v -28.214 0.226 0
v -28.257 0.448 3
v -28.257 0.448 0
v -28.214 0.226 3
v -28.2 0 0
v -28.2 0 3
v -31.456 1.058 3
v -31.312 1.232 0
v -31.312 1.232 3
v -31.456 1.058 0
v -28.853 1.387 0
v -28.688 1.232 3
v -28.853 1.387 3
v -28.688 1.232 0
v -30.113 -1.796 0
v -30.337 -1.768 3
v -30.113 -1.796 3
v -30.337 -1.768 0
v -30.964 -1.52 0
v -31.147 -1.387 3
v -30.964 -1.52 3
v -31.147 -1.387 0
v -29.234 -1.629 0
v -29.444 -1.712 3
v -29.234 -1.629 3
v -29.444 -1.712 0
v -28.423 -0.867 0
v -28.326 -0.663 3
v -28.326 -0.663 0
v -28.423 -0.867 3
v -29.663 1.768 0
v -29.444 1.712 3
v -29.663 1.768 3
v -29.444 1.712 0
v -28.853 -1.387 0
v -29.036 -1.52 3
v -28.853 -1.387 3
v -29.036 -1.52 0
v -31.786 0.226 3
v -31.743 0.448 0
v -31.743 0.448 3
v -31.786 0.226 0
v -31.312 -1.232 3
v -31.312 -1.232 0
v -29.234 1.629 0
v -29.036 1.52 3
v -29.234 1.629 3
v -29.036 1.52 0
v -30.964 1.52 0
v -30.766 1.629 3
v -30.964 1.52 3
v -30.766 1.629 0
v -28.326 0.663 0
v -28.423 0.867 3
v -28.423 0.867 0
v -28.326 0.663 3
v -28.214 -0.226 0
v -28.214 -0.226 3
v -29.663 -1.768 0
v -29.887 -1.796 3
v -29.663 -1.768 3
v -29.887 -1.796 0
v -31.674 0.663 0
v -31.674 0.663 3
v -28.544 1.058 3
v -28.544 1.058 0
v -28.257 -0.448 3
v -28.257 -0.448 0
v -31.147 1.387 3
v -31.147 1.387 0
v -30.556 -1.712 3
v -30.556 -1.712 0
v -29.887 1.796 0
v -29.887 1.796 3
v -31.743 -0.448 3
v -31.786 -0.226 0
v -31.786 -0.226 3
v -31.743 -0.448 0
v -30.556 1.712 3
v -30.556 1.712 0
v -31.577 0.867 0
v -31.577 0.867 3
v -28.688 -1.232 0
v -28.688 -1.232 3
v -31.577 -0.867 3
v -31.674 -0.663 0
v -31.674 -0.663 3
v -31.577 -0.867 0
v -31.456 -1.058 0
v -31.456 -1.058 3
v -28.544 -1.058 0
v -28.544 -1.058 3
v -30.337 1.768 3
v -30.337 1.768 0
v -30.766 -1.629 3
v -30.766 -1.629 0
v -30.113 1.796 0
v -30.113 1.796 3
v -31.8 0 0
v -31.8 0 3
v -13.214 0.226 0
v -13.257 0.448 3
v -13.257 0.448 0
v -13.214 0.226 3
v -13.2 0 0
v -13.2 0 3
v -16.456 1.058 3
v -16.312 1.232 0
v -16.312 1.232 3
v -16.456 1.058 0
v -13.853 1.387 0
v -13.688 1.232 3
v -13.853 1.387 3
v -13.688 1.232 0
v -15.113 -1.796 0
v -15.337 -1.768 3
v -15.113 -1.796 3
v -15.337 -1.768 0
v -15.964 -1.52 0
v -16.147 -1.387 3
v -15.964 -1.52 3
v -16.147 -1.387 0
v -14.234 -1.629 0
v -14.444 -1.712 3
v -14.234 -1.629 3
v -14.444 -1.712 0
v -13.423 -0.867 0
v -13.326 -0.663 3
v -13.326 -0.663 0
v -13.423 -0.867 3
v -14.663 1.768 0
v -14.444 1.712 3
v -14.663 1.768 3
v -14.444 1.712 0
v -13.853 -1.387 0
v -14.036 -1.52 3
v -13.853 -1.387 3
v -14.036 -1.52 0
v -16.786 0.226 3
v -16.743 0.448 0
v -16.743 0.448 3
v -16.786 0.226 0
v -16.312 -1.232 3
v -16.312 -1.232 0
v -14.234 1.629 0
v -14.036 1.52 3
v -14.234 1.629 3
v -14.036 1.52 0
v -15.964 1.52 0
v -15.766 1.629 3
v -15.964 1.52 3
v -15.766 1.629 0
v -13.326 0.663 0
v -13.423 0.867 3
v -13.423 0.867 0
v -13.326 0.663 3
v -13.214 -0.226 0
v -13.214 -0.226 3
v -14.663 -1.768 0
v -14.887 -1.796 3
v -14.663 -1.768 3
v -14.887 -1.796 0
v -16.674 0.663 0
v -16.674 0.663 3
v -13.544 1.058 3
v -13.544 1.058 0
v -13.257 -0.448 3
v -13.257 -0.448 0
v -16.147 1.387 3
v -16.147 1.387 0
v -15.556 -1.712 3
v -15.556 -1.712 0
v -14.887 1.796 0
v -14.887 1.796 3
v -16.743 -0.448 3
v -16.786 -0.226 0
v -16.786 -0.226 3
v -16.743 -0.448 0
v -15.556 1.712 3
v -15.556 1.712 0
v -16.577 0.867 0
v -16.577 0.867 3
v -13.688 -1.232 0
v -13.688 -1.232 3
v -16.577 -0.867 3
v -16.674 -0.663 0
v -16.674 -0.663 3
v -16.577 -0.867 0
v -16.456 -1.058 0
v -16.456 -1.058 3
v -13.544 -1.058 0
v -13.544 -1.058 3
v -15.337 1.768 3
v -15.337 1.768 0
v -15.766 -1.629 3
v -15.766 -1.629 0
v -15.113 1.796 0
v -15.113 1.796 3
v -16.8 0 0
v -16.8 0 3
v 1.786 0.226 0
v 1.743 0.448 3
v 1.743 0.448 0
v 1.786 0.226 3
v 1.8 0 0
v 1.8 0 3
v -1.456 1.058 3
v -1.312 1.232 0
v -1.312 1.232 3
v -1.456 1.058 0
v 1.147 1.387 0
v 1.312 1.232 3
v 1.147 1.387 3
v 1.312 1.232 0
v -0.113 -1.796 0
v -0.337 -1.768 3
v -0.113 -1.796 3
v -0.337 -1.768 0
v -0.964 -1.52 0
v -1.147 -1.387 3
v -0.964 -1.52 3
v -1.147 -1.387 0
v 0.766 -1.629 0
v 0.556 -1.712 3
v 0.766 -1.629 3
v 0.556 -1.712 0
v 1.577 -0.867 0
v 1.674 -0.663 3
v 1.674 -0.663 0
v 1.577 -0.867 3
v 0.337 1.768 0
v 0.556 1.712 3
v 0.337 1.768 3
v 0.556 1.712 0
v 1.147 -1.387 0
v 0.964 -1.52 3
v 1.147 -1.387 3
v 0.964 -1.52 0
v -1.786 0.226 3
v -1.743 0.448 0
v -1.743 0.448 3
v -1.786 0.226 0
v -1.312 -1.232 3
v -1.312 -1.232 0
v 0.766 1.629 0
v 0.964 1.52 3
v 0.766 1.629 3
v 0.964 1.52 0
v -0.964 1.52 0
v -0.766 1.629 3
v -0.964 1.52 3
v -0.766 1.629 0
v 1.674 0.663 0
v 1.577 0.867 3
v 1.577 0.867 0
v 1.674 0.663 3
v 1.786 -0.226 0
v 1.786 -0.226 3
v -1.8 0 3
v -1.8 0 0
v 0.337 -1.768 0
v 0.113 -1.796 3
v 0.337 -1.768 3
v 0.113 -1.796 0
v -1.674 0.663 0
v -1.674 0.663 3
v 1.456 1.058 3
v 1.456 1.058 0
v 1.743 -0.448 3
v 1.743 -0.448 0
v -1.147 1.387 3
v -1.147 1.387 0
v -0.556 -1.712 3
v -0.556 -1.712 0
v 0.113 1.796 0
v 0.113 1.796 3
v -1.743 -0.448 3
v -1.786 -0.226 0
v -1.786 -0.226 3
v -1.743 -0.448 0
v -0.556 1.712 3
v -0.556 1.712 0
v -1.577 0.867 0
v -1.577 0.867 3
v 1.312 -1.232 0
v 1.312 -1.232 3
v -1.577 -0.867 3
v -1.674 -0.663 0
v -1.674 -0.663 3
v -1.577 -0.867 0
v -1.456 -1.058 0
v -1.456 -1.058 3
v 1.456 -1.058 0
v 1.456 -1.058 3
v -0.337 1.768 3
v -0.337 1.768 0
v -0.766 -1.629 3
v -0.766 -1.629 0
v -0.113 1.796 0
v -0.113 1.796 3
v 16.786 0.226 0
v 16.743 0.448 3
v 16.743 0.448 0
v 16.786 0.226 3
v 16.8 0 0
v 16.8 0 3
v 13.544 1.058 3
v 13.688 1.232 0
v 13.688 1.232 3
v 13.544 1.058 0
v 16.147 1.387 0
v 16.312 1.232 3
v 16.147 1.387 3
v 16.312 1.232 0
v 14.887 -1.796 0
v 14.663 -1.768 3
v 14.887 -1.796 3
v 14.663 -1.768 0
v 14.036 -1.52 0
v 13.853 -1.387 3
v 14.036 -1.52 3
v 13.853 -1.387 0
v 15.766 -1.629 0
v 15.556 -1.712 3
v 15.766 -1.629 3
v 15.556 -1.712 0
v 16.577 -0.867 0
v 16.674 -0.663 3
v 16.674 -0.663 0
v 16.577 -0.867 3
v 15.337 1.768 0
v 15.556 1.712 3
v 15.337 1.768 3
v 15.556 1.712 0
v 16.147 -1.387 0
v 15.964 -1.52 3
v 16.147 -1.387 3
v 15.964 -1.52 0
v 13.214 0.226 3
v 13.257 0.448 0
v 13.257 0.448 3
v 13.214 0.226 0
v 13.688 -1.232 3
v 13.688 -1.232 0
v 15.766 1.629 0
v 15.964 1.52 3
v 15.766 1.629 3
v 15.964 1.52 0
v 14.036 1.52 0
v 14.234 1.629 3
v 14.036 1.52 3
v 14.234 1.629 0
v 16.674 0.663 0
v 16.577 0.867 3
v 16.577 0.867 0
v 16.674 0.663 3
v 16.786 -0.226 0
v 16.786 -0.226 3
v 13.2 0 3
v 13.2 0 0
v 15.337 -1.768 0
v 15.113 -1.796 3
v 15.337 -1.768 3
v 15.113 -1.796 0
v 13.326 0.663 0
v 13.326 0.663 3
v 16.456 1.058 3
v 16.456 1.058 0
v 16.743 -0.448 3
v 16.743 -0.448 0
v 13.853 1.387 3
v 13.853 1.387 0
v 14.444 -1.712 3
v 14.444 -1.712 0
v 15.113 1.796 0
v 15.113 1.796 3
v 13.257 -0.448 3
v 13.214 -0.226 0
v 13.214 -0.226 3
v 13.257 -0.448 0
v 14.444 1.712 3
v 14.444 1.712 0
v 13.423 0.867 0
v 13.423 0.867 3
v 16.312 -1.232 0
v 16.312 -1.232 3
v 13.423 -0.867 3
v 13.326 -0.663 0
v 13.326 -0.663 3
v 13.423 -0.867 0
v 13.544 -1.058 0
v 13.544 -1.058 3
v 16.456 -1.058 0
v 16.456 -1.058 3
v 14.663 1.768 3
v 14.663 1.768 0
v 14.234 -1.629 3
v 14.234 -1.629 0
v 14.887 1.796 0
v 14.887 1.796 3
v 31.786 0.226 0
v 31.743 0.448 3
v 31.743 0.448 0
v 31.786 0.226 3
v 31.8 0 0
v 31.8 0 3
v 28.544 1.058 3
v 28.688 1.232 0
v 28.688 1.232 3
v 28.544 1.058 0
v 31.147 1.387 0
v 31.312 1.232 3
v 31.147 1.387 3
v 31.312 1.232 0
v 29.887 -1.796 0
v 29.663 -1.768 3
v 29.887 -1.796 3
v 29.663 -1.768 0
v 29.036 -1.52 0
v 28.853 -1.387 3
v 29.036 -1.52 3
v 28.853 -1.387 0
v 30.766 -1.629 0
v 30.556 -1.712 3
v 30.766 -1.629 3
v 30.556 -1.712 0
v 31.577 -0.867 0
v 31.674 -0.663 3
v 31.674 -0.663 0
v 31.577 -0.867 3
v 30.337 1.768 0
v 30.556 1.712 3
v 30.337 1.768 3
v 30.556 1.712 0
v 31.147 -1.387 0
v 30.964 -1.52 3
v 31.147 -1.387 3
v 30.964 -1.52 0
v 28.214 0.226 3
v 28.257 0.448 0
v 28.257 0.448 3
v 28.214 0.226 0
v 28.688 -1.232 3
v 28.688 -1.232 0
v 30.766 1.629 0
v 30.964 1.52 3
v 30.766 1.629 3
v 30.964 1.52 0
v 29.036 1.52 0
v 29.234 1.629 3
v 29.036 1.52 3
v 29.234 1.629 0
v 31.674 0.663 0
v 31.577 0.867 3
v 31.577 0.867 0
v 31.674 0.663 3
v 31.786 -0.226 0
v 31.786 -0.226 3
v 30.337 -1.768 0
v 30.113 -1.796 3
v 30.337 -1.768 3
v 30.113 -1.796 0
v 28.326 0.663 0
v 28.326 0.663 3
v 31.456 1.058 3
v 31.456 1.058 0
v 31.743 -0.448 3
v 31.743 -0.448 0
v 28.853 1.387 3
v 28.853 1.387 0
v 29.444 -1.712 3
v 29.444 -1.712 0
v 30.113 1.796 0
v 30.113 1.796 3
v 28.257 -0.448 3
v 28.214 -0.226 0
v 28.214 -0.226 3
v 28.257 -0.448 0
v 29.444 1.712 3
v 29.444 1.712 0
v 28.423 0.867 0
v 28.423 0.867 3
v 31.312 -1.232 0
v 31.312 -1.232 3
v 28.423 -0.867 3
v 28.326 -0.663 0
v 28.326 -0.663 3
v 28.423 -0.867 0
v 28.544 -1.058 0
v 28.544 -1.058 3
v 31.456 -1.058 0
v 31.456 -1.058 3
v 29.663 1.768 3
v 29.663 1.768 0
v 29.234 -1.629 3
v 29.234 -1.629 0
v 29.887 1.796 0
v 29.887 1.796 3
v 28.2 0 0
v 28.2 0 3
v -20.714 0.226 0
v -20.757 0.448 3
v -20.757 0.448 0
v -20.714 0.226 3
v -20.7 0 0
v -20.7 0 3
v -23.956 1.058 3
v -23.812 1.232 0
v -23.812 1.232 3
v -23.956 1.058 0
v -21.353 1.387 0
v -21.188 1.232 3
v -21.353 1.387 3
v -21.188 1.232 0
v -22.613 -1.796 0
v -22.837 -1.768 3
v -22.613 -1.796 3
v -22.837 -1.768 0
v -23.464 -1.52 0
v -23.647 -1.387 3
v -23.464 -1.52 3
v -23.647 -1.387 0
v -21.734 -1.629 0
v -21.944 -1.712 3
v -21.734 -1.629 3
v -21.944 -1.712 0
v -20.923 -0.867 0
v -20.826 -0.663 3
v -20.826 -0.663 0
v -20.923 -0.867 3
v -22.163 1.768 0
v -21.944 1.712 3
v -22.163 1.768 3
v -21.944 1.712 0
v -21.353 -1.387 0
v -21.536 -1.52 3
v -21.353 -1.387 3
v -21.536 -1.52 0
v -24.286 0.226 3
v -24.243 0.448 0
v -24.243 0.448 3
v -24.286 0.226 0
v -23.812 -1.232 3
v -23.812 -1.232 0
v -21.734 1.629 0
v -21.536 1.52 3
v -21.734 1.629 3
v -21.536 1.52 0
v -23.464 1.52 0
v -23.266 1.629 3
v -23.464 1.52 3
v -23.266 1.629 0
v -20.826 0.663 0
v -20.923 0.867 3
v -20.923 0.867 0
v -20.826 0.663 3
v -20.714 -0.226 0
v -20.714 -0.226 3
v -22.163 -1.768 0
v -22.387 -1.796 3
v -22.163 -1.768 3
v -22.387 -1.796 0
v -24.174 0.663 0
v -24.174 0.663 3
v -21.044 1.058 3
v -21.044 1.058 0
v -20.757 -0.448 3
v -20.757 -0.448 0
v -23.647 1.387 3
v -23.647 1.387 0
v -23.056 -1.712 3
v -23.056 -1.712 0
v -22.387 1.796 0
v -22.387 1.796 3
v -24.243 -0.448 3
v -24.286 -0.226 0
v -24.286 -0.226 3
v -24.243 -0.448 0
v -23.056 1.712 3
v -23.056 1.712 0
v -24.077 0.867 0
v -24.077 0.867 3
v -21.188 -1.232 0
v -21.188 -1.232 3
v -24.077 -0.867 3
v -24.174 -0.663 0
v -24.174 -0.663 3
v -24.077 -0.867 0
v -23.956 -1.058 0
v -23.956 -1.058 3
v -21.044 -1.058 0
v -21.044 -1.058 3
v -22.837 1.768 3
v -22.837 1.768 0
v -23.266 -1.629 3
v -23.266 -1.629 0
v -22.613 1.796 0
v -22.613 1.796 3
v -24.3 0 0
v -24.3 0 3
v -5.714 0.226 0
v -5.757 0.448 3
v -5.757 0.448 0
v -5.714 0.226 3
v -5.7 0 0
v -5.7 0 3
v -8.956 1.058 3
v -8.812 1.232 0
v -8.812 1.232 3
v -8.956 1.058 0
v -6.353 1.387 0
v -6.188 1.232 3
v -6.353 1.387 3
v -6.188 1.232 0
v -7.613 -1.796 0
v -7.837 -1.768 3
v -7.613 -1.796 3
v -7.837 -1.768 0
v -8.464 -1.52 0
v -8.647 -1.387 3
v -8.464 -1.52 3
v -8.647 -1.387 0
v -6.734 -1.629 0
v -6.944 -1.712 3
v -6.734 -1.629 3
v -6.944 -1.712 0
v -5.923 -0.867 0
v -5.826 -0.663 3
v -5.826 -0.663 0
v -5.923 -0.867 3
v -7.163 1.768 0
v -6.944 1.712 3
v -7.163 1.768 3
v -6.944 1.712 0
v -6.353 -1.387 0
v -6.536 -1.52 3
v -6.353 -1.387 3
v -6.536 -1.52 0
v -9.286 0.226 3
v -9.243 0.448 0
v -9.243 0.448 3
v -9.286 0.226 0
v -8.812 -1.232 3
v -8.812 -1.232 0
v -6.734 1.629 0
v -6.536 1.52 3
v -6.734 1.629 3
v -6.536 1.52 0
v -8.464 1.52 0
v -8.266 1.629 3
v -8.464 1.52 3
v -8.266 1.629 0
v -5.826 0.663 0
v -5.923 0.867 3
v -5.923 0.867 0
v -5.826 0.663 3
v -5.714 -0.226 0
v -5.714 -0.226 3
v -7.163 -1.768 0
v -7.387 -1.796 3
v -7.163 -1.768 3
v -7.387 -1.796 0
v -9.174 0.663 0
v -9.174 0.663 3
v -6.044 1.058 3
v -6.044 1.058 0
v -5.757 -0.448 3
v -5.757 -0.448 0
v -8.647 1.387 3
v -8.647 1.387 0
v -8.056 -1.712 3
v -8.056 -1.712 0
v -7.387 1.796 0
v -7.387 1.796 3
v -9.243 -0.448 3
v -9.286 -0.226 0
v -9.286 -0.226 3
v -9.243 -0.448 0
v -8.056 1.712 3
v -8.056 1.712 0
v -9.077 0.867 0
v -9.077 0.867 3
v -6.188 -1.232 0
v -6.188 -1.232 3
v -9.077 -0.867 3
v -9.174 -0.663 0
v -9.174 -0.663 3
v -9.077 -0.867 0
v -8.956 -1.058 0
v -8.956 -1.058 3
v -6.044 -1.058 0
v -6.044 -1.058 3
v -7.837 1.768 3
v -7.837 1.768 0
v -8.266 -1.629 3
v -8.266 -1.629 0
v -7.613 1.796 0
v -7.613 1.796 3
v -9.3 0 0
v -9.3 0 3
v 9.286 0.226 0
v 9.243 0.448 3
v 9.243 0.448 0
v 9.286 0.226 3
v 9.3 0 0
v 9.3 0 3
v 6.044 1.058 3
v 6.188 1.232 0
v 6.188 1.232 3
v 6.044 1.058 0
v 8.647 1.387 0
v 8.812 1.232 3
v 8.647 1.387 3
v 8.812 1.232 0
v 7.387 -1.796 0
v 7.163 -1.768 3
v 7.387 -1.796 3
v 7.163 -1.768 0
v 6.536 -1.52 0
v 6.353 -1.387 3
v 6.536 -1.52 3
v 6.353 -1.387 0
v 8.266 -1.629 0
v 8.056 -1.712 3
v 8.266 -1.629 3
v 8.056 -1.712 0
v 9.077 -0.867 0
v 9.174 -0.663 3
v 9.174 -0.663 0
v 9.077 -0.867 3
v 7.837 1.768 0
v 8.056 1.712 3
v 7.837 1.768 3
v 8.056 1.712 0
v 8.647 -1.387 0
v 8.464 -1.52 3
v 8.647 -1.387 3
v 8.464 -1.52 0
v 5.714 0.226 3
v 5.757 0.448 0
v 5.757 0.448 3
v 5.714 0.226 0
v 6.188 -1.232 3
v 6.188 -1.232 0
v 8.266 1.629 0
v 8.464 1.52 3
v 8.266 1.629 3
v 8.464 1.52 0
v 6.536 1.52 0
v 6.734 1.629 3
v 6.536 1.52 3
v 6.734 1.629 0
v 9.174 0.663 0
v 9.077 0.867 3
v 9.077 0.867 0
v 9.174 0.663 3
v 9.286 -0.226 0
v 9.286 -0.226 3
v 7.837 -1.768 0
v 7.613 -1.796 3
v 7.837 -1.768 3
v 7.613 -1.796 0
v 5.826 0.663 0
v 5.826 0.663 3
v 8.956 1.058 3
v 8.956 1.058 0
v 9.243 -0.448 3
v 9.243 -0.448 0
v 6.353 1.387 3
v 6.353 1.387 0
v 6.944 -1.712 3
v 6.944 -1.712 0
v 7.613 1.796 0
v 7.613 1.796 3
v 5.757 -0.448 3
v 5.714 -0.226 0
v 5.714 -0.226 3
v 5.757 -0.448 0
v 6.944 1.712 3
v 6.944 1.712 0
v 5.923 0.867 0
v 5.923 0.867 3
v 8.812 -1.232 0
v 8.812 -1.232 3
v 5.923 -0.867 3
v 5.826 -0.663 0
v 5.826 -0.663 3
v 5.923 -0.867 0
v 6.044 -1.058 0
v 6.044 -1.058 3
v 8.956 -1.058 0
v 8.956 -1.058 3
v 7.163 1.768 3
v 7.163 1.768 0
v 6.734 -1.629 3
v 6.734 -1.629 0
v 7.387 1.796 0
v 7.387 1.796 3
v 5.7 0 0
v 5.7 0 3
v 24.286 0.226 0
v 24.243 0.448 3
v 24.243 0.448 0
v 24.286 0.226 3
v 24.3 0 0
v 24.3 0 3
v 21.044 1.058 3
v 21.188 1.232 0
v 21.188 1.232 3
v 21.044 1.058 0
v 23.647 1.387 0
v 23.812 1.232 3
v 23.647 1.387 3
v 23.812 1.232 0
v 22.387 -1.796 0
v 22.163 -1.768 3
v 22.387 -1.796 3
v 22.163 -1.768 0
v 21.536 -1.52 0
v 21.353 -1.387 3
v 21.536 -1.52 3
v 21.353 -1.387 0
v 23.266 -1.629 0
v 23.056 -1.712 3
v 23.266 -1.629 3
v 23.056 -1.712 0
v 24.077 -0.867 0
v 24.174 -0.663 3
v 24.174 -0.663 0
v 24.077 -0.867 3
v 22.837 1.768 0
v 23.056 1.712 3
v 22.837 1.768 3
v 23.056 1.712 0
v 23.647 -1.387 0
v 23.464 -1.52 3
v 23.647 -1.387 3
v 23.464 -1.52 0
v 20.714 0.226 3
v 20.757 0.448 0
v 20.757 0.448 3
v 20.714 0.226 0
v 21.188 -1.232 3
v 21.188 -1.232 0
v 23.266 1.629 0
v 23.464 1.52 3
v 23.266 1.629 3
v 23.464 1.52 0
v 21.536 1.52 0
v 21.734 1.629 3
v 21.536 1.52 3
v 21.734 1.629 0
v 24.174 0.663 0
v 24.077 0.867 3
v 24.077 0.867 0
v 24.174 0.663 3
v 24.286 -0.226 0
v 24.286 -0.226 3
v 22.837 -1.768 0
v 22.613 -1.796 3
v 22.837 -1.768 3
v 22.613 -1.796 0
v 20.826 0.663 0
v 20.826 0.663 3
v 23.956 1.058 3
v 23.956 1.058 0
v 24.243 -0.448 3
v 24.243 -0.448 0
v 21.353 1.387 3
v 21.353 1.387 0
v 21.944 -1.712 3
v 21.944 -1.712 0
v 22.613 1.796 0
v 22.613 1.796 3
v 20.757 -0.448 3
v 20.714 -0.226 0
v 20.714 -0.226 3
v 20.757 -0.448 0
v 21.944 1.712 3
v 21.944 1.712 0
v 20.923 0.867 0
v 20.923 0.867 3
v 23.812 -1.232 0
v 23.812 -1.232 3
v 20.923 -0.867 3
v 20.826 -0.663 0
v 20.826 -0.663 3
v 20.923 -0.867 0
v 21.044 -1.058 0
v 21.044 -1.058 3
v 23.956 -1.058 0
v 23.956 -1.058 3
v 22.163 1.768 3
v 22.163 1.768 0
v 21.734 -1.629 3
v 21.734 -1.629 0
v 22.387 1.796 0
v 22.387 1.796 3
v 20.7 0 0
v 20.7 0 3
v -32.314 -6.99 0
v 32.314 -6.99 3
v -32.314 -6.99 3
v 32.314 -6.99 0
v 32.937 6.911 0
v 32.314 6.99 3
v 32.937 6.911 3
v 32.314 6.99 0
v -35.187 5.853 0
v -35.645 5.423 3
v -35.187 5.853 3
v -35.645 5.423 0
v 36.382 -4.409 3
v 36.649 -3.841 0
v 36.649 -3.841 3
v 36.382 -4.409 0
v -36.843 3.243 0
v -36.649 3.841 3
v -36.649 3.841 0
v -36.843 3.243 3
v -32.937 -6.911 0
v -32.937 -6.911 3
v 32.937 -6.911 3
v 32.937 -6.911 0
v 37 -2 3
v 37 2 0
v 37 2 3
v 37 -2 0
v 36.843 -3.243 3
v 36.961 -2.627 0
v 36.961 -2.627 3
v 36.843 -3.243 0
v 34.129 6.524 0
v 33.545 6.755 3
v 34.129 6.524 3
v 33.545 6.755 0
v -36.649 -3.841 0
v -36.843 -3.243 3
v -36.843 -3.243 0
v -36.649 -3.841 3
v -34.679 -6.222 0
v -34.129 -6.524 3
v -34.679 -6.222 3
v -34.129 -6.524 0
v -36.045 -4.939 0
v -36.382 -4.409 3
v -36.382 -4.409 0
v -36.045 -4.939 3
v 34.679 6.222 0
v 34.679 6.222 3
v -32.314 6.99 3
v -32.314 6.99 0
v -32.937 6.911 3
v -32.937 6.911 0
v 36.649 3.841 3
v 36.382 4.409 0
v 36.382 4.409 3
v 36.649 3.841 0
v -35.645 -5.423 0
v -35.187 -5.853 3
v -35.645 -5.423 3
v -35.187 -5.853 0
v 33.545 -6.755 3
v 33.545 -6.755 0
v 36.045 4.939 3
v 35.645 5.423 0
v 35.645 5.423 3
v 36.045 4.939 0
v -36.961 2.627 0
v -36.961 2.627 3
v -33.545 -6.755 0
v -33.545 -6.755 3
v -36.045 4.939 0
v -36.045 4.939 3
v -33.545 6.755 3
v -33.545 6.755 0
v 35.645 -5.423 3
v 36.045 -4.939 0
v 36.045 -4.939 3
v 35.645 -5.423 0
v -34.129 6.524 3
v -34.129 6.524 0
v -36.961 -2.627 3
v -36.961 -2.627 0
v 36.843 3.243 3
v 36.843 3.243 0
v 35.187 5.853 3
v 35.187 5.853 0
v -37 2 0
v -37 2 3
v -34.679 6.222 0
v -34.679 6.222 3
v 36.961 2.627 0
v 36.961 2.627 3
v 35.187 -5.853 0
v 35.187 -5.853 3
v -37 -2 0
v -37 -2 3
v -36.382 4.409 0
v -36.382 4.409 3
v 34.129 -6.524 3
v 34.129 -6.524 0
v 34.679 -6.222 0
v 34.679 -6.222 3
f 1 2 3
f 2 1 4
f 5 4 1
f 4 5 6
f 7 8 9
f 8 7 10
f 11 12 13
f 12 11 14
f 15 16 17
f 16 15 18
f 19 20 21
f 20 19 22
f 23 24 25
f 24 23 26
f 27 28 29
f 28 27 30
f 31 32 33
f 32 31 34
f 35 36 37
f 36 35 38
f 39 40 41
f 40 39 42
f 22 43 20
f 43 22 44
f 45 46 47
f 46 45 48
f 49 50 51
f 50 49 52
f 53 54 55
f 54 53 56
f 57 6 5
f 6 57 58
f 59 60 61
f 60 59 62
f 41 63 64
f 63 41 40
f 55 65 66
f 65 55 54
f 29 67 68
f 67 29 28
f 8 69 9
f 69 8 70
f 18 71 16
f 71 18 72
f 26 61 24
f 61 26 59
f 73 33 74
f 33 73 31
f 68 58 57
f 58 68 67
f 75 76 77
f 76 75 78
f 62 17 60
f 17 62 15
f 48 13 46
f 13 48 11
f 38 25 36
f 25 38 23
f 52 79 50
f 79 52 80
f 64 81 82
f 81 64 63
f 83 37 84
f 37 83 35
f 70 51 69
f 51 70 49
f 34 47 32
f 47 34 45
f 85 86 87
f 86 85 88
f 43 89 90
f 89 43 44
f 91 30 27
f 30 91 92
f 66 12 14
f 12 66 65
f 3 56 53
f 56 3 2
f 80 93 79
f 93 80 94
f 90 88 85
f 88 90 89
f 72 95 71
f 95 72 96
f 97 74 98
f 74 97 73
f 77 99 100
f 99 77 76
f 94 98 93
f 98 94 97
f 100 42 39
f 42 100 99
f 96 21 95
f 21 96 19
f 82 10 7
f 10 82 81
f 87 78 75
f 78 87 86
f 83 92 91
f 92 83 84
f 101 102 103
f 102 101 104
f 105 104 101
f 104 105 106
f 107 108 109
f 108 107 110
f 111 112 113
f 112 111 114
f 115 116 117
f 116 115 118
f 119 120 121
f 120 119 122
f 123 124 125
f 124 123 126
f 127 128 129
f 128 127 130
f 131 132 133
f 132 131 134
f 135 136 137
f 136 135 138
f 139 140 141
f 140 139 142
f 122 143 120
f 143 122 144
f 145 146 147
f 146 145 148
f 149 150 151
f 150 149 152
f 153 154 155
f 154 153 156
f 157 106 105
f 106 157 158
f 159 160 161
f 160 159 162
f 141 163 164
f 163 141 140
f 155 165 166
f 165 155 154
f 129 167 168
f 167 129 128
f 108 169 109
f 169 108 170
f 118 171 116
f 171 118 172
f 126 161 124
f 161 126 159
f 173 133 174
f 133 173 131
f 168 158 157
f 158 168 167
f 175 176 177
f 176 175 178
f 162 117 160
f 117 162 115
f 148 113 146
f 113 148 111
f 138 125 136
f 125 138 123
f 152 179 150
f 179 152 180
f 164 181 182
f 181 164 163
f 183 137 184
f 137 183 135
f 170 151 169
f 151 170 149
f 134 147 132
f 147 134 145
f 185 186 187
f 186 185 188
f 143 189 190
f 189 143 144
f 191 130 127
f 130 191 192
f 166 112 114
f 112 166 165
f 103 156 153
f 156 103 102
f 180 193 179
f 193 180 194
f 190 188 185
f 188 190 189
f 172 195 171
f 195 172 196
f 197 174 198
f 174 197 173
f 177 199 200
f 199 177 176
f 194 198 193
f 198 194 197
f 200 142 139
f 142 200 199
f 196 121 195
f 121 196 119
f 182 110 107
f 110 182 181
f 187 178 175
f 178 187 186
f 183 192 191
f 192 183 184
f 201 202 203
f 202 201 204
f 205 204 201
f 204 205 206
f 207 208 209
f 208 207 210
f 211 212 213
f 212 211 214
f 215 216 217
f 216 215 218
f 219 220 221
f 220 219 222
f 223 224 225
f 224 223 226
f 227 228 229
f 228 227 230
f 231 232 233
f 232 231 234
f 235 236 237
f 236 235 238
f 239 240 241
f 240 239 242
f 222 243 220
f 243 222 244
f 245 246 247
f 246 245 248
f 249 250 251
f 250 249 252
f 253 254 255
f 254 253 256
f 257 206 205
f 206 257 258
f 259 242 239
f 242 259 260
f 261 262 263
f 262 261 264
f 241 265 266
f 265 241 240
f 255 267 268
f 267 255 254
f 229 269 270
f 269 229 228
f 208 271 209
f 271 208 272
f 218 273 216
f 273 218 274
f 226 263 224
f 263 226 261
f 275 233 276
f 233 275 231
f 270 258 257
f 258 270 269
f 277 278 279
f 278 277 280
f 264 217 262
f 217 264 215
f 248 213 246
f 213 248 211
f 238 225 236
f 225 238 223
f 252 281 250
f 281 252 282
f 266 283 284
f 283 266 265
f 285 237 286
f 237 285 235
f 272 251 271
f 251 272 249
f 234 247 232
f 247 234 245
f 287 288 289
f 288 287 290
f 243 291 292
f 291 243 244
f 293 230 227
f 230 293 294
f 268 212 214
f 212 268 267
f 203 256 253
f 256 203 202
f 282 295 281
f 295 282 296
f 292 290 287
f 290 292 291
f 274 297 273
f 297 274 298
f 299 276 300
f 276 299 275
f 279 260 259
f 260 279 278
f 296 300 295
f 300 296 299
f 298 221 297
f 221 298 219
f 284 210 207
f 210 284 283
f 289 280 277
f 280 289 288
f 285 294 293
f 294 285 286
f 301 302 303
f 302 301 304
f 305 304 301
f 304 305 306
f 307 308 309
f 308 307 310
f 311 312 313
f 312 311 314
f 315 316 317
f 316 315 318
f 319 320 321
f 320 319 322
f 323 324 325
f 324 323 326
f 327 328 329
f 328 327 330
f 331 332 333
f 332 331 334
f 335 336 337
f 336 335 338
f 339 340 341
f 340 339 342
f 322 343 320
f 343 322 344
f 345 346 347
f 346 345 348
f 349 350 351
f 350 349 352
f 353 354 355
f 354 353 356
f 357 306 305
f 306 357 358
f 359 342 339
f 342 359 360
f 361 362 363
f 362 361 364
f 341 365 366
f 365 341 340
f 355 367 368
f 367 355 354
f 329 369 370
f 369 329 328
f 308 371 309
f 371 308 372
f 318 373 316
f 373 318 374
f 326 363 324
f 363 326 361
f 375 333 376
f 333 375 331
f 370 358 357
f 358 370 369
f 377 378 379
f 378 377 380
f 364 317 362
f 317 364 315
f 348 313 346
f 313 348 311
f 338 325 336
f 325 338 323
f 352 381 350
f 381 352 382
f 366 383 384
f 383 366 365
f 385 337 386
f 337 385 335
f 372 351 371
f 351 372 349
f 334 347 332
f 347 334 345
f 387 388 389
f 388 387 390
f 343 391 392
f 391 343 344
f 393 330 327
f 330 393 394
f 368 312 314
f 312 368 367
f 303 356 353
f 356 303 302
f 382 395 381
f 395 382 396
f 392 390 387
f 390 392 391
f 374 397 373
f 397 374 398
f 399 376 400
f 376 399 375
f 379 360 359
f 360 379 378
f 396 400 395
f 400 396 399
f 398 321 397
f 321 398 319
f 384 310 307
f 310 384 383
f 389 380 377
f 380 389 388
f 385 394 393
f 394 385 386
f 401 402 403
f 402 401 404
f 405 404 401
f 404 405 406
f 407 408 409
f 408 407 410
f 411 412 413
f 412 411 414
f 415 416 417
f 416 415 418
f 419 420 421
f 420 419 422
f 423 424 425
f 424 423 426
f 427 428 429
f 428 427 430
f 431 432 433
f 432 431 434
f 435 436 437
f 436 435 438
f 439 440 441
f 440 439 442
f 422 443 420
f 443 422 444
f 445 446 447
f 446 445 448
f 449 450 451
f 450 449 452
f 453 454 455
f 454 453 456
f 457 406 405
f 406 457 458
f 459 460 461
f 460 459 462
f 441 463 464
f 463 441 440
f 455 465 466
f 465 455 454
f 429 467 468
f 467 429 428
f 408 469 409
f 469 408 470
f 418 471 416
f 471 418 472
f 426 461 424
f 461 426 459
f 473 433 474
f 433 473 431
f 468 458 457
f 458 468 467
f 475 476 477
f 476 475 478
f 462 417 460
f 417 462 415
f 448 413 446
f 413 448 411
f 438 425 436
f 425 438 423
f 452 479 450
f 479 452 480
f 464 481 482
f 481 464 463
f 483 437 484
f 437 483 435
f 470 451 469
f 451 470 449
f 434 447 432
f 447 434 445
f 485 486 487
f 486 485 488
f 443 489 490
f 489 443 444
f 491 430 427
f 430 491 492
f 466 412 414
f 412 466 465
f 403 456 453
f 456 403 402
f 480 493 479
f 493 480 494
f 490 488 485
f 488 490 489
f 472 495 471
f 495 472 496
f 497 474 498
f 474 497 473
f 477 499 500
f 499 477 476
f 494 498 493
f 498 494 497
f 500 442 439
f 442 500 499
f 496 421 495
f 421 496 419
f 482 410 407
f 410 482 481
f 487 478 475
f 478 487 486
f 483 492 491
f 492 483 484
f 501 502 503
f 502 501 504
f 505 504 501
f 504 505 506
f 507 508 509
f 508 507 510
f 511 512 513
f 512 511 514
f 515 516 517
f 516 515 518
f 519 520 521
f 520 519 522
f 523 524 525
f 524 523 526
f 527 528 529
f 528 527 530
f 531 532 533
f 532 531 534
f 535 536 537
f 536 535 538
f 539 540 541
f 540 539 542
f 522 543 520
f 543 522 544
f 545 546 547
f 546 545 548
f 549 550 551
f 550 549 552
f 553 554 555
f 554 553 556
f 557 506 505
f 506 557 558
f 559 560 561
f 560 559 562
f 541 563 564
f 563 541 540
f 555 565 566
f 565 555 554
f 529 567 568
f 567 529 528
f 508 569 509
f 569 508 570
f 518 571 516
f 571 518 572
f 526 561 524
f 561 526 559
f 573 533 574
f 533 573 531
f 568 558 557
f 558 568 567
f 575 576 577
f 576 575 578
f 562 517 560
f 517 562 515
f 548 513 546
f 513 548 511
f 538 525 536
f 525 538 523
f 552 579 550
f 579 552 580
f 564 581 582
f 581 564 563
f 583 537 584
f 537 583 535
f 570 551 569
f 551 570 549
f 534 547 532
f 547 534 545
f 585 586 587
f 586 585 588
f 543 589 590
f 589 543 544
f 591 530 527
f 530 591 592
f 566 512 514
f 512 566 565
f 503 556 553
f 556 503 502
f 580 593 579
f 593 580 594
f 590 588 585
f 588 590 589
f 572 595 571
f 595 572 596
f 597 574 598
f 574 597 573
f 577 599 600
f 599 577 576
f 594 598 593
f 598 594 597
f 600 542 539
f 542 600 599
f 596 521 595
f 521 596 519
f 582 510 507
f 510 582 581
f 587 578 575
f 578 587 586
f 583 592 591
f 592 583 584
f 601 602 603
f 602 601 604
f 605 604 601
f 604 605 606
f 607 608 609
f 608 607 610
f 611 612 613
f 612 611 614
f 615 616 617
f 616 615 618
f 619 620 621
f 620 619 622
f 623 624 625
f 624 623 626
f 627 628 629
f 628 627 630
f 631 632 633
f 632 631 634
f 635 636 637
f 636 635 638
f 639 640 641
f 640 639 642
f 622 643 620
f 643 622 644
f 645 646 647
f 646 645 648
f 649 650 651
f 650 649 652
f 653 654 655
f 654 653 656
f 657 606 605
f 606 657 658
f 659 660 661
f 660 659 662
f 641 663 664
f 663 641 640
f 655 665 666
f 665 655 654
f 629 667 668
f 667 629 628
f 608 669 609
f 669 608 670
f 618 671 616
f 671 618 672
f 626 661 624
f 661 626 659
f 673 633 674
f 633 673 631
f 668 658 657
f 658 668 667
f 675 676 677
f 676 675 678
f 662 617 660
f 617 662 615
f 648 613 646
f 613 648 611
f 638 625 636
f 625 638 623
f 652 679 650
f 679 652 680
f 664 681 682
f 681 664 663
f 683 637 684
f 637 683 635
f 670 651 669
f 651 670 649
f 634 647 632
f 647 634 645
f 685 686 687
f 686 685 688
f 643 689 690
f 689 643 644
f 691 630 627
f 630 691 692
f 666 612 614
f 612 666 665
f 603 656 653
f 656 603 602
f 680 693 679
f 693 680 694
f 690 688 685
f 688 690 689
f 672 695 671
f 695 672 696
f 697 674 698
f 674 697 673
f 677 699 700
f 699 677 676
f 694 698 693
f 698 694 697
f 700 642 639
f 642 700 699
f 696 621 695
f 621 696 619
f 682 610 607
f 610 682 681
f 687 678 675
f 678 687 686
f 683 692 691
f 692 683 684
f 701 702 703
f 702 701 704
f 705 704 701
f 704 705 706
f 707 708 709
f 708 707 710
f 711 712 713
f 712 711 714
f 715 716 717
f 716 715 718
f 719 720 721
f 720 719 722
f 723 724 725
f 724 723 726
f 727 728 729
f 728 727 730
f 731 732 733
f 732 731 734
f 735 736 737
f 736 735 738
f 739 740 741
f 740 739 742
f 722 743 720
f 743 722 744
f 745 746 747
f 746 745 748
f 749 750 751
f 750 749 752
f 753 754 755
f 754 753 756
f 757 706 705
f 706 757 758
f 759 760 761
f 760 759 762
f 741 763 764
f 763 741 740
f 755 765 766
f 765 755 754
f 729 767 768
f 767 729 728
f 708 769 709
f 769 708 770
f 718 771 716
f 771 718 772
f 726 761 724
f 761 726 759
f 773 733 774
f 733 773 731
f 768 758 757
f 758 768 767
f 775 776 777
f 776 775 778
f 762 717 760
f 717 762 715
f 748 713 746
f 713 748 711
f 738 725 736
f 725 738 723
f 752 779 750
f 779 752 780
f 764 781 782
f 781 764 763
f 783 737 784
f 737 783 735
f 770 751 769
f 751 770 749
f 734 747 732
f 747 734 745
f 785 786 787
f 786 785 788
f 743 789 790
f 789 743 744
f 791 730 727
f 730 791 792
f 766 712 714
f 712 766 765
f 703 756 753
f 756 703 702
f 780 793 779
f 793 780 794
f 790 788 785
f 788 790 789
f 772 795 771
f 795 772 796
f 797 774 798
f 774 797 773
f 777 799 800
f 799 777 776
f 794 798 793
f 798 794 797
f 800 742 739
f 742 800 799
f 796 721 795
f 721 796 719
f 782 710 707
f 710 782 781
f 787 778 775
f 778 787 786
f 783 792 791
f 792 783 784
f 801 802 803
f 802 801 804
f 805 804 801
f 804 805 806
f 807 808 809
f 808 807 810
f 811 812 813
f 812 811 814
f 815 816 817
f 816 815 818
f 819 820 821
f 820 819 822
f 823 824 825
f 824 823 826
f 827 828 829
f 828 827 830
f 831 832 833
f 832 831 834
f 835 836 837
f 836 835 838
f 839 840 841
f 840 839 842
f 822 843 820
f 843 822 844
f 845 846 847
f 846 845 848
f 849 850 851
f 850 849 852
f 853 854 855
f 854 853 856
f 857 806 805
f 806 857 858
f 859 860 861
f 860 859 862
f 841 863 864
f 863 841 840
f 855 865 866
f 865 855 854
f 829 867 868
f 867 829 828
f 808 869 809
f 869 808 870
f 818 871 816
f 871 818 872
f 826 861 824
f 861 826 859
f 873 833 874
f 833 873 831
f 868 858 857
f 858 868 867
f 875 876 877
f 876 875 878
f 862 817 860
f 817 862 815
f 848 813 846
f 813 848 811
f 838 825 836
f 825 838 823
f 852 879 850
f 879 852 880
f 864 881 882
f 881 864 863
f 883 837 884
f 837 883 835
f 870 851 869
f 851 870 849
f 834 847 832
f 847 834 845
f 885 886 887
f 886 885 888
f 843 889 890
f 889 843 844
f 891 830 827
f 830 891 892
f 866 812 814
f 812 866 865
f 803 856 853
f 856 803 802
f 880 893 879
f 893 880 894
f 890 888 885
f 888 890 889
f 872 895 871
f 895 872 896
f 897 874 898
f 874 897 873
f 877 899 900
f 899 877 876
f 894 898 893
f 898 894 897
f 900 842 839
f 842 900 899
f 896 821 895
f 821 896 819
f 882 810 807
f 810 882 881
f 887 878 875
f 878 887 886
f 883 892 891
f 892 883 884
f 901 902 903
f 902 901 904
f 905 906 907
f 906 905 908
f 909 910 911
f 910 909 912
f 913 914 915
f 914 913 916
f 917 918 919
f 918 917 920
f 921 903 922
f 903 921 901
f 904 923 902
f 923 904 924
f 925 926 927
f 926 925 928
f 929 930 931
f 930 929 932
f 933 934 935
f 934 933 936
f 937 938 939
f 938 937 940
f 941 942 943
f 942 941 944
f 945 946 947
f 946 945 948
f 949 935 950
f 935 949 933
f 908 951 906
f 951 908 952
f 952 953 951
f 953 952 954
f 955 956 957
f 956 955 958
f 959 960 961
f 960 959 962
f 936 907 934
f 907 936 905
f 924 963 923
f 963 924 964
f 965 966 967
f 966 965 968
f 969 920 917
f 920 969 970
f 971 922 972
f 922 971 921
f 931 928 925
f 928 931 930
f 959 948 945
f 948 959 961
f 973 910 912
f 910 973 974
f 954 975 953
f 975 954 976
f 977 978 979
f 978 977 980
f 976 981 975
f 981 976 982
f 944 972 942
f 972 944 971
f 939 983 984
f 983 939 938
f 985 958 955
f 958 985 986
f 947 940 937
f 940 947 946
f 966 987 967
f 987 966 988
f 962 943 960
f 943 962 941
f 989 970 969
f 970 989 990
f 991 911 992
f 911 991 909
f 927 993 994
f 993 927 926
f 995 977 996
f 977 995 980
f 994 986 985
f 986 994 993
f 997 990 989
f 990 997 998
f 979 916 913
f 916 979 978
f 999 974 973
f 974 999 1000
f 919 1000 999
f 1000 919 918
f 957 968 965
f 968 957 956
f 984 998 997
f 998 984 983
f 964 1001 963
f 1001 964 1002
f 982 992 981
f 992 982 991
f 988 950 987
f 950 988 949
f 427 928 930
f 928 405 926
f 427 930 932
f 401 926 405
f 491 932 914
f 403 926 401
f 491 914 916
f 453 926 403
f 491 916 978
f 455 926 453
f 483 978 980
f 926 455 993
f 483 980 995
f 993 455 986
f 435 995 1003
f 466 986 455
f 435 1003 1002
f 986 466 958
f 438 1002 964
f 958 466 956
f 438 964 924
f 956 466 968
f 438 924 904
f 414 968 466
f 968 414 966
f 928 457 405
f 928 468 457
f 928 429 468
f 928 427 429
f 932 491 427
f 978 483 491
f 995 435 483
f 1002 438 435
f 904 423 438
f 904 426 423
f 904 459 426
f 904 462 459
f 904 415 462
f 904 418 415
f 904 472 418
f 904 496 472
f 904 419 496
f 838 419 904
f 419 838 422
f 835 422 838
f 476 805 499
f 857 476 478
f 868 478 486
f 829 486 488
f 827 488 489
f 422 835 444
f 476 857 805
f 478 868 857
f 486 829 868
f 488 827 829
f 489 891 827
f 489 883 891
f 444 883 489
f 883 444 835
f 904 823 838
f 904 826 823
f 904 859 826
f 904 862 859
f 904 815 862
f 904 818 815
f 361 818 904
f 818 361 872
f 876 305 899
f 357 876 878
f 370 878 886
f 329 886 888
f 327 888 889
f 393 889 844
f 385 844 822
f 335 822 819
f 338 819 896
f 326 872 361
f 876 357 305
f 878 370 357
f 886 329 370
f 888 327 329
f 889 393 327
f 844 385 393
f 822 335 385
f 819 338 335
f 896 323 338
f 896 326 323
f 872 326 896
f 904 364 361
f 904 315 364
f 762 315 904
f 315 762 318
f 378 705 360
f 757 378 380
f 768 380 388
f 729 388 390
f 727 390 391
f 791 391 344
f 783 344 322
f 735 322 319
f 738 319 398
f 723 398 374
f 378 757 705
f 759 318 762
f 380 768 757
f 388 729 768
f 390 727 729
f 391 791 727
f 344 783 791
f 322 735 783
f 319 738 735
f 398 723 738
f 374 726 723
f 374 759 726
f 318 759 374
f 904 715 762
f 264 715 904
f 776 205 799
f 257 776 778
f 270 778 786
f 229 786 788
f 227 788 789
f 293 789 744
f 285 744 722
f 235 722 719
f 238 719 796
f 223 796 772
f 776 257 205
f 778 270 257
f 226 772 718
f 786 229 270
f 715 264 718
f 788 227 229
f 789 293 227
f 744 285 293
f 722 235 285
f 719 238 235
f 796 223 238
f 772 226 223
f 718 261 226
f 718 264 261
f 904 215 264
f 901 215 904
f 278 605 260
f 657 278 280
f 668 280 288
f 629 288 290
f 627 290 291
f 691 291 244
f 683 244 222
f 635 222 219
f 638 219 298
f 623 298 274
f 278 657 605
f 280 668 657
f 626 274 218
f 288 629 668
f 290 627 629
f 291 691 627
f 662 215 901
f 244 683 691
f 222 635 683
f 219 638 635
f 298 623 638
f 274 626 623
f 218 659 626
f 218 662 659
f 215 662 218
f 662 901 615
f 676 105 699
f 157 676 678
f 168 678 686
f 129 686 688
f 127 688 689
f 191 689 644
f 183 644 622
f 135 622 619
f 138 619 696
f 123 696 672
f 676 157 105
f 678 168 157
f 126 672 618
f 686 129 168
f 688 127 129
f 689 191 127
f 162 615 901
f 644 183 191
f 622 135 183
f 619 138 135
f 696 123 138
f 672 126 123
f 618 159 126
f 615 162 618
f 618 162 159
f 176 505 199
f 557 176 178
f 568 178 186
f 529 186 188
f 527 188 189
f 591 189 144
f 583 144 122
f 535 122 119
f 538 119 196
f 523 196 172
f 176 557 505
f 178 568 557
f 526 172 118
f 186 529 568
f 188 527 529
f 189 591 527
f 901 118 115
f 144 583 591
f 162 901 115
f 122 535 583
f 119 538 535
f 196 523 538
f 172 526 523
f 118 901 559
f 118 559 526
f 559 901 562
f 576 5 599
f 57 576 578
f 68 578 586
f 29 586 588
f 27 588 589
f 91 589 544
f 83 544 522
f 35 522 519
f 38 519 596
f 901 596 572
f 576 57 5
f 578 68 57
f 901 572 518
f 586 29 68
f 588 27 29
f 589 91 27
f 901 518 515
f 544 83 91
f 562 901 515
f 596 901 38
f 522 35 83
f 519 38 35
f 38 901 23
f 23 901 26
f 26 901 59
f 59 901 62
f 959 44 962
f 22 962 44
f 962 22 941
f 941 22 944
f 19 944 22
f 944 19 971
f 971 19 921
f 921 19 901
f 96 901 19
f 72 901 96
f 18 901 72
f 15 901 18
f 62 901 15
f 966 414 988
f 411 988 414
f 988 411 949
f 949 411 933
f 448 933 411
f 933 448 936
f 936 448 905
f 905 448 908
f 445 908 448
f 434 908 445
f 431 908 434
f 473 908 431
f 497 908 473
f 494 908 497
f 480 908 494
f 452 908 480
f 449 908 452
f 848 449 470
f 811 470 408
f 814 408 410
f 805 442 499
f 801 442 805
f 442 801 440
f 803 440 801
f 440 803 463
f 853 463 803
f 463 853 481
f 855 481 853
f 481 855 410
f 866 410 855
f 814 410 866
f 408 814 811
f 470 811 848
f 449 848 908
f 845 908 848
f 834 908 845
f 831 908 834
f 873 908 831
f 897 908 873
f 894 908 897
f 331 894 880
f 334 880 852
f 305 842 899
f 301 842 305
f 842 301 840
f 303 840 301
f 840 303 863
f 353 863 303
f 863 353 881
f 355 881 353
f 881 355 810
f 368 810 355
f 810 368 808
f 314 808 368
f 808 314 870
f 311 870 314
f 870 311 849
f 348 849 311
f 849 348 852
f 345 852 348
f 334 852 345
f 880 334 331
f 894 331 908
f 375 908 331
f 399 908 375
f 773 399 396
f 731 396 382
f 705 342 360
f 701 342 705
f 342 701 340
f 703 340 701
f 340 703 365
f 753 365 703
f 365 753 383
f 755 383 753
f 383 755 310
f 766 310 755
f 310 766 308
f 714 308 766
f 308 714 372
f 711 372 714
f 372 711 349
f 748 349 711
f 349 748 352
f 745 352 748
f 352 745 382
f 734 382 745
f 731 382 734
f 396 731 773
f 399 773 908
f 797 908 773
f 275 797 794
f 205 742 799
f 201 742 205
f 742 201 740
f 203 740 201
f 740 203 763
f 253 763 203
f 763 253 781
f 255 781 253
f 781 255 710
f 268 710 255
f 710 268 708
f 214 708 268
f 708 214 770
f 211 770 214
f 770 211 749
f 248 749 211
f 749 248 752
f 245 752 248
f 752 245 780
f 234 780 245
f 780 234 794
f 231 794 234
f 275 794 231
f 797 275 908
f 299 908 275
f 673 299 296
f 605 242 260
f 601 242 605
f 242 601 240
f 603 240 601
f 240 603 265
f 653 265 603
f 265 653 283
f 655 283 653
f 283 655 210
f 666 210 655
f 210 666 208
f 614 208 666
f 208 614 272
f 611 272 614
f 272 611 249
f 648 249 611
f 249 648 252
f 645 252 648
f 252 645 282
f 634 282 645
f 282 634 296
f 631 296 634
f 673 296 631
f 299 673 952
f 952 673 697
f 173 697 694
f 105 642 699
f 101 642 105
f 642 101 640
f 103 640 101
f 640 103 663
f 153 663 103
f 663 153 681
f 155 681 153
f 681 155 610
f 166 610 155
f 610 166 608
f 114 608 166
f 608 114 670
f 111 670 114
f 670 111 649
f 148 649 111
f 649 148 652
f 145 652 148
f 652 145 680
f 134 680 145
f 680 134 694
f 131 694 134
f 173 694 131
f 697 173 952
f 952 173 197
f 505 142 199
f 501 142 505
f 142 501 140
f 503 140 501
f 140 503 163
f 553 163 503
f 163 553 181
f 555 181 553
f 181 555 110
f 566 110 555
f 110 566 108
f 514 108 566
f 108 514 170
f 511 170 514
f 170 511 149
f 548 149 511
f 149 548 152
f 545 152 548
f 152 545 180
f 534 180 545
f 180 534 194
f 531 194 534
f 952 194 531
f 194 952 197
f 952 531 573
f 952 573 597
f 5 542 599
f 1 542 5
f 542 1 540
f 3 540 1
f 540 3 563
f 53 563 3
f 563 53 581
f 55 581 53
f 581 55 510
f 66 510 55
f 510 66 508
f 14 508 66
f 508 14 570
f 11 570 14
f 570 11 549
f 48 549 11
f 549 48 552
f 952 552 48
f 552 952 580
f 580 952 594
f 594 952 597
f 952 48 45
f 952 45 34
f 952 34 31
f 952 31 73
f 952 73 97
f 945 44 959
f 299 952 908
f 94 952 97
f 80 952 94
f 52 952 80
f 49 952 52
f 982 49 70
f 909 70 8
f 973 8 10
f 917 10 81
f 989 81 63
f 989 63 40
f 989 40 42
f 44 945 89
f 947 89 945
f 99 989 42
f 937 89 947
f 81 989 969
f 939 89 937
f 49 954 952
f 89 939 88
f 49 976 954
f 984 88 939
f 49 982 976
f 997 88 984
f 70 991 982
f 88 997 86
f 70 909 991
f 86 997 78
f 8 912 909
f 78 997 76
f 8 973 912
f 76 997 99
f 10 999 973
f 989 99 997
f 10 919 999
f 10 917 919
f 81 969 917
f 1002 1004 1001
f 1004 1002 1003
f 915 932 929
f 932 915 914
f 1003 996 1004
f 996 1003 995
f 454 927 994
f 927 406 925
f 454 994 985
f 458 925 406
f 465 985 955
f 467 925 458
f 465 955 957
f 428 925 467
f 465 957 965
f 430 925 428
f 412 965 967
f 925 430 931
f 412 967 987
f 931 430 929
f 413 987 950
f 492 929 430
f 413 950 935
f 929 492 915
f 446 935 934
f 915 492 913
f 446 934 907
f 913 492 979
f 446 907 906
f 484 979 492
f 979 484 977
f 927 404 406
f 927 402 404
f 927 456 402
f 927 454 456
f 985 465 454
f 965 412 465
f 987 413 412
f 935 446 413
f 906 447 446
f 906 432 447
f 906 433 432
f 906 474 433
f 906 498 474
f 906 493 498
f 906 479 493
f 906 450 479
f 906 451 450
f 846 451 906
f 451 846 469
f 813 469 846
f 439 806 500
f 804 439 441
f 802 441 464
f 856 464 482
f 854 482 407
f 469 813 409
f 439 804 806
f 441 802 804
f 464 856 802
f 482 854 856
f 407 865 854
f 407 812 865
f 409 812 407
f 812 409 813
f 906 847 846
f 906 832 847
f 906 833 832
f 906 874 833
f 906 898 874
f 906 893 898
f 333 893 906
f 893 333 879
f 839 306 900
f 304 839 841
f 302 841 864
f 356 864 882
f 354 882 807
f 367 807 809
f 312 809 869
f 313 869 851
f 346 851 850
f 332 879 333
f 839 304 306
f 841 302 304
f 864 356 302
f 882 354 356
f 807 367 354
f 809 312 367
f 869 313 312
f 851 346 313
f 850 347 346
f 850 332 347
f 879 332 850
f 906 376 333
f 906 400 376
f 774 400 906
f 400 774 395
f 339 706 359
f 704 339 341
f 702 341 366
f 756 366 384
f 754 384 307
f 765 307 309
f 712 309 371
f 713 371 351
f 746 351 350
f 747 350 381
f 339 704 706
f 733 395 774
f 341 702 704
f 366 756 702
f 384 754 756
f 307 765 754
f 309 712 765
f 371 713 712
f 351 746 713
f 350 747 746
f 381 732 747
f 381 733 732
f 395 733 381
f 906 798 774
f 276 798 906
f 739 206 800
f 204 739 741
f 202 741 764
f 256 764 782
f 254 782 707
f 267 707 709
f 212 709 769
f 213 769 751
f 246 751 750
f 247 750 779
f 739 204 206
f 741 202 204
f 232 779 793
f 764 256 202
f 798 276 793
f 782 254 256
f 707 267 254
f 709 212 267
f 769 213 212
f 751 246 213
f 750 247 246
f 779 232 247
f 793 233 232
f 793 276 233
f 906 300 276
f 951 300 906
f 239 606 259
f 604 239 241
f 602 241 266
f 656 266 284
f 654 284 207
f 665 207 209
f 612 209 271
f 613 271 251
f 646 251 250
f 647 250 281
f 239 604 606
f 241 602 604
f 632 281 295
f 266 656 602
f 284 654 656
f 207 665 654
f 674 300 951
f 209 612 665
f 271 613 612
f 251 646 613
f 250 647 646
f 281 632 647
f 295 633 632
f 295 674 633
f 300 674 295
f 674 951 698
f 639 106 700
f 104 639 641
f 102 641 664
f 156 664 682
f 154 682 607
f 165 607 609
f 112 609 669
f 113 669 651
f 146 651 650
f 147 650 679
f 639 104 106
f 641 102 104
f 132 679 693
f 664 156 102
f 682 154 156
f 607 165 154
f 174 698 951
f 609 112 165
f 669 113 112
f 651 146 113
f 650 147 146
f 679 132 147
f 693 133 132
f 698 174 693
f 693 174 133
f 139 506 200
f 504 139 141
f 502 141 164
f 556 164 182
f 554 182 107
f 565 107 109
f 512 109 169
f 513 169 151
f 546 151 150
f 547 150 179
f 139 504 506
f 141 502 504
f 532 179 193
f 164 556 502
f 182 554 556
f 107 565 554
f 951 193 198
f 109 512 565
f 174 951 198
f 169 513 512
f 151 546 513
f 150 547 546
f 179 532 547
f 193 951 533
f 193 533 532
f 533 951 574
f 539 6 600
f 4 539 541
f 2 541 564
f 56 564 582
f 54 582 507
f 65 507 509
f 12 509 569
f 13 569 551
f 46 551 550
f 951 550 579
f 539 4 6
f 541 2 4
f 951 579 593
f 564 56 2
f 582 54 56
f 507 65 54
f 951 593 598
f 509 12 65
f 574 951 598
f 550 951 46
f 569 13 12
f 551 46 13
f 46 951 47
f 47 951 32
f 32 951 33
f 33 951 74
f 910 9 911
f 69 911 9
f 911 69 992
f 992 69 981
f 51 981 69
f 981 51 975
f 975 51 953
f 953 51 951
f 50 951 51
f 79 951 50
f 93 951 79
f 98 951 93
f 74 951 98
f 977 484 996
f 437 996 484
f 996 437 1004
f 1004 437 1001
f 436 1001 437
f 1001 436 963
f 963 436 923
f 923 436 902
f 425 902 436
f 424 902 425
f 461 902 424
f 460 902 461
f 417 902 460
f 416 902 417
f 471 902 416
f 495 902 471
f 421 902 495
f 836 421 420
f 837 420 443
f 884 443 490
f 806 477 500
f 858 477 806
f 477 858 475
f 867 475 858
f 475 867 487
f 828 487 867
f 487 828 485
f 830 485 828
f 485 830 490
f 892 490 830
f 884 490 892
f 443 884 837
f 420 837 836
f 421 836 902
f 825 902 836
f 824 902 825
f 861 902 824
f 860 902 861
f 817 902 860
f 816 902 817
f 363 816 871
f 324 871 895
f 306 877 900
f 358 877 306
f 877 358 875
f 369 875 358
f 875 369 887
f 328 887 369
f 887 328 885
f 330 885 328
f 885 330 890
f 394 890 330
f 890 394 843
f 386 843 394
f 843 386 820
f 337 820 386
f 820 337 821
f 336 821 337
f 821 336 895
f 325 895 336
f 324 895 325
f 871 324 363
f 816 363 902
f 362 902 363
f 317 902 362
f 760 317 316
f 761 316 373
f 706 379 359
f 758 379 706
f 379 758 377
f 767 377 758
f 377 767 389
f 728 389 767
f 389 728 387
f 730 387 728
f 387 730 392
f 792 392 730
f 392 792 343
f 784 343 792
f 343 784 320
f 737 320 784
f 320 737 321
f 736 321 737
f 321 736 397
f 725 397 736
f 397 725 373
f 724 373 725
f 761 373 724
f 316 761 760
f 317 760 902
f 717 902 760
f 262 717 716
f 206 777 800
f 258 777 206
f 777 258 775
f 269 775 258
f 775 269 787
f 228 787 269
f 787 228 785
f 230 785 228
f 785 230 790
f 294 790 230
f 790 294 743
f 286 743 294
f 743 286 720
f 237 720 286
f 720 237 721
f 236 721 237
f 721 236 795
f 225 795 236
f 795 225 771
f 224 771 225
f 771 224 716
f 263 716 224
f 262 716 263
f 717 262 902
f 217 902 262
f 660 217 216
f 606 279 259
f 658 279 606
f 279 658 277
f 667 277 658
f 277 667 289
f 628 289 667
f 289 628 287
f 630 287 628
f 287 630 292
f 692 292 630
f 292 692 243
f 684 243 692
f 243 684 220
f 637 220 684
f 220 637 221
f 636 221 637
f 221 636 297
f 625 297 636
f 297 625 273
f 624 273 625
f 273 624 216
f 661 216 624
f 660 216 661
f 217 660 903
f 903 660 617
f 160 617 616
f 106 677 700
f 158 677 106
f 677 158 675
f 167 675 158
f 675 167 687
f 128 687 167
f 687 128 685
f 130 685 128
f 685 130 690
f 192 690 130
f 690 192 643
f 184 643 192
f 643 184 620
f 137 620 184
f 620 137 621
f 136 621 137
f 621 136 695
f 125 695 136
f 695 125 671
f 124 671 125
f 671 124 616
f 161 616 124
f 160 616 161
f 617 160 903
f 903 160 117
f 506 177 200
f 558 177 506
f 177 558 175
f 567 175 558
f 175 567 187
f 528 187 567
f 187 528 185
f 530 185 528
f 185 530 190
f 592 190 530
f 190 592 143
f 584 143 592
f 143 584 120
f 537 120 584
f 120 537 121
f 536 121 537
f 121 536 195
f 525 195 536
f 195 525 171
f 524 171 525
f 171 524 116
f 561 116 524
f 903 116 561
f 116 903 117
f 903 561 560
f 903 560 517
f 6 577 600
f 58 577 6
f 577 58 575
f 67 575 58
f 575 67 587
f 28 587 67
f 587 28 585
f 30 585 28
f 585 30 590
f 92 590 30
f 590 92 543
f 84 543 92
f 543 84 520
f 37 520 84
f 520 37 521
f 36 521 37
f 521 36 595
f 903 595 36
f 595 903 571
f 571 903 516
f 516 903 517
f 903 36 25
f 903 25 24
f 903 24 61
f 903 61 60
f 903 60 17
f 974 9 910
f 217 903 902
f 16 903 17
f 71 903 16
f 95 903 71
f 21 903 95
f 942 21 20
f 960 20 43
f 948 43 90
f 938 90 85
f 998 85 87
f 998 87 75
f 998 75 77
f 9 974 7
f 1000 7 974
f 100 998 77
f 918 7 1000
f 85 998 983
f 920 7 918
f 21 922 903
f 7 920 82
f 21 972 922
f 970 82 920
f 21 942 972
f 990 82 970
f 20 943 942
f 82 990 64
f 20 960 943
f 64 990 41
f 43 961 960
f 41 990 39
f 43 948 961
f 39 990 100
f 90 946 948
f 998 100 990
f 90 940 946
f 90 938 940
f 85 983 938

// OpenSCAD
$fn = 50;


difference() {
	union() {
		hull() {
			translate(v = [-32.0000000000, 2.0000000000, 0]) {
				cylinder(h = 3, r = 5);
			}
			translate(v = [32.0000000000, 2.0000000000, 0]) {
				cylinder(h = 3, r = 5);
			}
			translate(v = [-32.0000000000, -2.0000000000, 0]) {
				cylinder(h = 3, r = 5);
			}
			translate(v = [32.0000000000, -2.0000000000, 0]) {
				cylinder(h = 3, r = 5);
			}
		}
	}
	union() {
		translate(v = [-30.0000000000, 0.0000000000, 0]) {
			translate(v = [0, 0, -100]) {
				cylinder(h = 200, r = 1.8000000000);
			}
		}
		translate(v = [-15.0000000000, 0.0000000000, 0]) {
			translate(v = [0, 0, -100]) {
				cylinder(h = 200, r = 1.8000000000);
			}
		}
		translate(v = [0, 0, -100]) {
			cylinder(h = 200, r = 1.8000000000);
		}
		translate(v = [15.0000000000, 0.0000000000, 0]) {
			translate(v = [0, 0, -100]) {
				cylinder(h = 200, r = 1.8000000000);
			}
		}
		translate(v = [30.0000000000, 0.0000000000, 0]) {
			translate(v = [0, 0, -100]) {
				cylinder(h = 200, r = 1.8000000000);
			}
		}
		translate(v = [-30.0000000000, 0.0000000000, 0]) {
			translate(v = [0, 0, -100]) {
				cylinder(h = 200, r = 1.8000000000);
			}
		}
		translate(v = [-22.5000000000, 0.0000000000, 0]) {
			translate(v = [0, 0, -100]) {
				cylinder(h = 200, r = 1.8000000000);
			}
		}
		translate(v = [-15.0000000000, 0.0000000000, 0]) {
			translate(v = [0, 0, -100]) {
				cylinder(h = 200, r = 1.8000000000);
			}
		}
		translate(v = [-7.5000000000, 0.0000000000, 0]) {
			translate(v = [0, 0, -100]) {
				cylinder(h = 200, r = 1.8000000000);
			}
		}
		translate(v = [0, 0, -100]) {
			cylinder(h = 200, r = 1.8000000000);
		}
		translate(v = [7.5000000000, 0.0000000000, 0]) {
			translate(v = [0, 0, -100]) {
				cylinder(h = 200, r = 1.8000000000);
			}
		}
		translate(v = [15.0000000000, 0.0000000000, 0]) {
			translate(v = [0, 0, -100]) {
				cylinder(h = 200, r = 1.8000000000);
			}
		}
		translate(v = [22.5000000000, 0.0000000000, 0]) {
			translate(v = [0, 0, -100]) {
				cylinder(h = 200, r = 1.8000000000);
			}
		}
		translate(v = [30.0000000000, 0.0000000000, 0]) {
			translate(v = [0, 0, -100]) {
				cylinder(h = 200, r = 1.8000000000);
			}
		}
	}
}
